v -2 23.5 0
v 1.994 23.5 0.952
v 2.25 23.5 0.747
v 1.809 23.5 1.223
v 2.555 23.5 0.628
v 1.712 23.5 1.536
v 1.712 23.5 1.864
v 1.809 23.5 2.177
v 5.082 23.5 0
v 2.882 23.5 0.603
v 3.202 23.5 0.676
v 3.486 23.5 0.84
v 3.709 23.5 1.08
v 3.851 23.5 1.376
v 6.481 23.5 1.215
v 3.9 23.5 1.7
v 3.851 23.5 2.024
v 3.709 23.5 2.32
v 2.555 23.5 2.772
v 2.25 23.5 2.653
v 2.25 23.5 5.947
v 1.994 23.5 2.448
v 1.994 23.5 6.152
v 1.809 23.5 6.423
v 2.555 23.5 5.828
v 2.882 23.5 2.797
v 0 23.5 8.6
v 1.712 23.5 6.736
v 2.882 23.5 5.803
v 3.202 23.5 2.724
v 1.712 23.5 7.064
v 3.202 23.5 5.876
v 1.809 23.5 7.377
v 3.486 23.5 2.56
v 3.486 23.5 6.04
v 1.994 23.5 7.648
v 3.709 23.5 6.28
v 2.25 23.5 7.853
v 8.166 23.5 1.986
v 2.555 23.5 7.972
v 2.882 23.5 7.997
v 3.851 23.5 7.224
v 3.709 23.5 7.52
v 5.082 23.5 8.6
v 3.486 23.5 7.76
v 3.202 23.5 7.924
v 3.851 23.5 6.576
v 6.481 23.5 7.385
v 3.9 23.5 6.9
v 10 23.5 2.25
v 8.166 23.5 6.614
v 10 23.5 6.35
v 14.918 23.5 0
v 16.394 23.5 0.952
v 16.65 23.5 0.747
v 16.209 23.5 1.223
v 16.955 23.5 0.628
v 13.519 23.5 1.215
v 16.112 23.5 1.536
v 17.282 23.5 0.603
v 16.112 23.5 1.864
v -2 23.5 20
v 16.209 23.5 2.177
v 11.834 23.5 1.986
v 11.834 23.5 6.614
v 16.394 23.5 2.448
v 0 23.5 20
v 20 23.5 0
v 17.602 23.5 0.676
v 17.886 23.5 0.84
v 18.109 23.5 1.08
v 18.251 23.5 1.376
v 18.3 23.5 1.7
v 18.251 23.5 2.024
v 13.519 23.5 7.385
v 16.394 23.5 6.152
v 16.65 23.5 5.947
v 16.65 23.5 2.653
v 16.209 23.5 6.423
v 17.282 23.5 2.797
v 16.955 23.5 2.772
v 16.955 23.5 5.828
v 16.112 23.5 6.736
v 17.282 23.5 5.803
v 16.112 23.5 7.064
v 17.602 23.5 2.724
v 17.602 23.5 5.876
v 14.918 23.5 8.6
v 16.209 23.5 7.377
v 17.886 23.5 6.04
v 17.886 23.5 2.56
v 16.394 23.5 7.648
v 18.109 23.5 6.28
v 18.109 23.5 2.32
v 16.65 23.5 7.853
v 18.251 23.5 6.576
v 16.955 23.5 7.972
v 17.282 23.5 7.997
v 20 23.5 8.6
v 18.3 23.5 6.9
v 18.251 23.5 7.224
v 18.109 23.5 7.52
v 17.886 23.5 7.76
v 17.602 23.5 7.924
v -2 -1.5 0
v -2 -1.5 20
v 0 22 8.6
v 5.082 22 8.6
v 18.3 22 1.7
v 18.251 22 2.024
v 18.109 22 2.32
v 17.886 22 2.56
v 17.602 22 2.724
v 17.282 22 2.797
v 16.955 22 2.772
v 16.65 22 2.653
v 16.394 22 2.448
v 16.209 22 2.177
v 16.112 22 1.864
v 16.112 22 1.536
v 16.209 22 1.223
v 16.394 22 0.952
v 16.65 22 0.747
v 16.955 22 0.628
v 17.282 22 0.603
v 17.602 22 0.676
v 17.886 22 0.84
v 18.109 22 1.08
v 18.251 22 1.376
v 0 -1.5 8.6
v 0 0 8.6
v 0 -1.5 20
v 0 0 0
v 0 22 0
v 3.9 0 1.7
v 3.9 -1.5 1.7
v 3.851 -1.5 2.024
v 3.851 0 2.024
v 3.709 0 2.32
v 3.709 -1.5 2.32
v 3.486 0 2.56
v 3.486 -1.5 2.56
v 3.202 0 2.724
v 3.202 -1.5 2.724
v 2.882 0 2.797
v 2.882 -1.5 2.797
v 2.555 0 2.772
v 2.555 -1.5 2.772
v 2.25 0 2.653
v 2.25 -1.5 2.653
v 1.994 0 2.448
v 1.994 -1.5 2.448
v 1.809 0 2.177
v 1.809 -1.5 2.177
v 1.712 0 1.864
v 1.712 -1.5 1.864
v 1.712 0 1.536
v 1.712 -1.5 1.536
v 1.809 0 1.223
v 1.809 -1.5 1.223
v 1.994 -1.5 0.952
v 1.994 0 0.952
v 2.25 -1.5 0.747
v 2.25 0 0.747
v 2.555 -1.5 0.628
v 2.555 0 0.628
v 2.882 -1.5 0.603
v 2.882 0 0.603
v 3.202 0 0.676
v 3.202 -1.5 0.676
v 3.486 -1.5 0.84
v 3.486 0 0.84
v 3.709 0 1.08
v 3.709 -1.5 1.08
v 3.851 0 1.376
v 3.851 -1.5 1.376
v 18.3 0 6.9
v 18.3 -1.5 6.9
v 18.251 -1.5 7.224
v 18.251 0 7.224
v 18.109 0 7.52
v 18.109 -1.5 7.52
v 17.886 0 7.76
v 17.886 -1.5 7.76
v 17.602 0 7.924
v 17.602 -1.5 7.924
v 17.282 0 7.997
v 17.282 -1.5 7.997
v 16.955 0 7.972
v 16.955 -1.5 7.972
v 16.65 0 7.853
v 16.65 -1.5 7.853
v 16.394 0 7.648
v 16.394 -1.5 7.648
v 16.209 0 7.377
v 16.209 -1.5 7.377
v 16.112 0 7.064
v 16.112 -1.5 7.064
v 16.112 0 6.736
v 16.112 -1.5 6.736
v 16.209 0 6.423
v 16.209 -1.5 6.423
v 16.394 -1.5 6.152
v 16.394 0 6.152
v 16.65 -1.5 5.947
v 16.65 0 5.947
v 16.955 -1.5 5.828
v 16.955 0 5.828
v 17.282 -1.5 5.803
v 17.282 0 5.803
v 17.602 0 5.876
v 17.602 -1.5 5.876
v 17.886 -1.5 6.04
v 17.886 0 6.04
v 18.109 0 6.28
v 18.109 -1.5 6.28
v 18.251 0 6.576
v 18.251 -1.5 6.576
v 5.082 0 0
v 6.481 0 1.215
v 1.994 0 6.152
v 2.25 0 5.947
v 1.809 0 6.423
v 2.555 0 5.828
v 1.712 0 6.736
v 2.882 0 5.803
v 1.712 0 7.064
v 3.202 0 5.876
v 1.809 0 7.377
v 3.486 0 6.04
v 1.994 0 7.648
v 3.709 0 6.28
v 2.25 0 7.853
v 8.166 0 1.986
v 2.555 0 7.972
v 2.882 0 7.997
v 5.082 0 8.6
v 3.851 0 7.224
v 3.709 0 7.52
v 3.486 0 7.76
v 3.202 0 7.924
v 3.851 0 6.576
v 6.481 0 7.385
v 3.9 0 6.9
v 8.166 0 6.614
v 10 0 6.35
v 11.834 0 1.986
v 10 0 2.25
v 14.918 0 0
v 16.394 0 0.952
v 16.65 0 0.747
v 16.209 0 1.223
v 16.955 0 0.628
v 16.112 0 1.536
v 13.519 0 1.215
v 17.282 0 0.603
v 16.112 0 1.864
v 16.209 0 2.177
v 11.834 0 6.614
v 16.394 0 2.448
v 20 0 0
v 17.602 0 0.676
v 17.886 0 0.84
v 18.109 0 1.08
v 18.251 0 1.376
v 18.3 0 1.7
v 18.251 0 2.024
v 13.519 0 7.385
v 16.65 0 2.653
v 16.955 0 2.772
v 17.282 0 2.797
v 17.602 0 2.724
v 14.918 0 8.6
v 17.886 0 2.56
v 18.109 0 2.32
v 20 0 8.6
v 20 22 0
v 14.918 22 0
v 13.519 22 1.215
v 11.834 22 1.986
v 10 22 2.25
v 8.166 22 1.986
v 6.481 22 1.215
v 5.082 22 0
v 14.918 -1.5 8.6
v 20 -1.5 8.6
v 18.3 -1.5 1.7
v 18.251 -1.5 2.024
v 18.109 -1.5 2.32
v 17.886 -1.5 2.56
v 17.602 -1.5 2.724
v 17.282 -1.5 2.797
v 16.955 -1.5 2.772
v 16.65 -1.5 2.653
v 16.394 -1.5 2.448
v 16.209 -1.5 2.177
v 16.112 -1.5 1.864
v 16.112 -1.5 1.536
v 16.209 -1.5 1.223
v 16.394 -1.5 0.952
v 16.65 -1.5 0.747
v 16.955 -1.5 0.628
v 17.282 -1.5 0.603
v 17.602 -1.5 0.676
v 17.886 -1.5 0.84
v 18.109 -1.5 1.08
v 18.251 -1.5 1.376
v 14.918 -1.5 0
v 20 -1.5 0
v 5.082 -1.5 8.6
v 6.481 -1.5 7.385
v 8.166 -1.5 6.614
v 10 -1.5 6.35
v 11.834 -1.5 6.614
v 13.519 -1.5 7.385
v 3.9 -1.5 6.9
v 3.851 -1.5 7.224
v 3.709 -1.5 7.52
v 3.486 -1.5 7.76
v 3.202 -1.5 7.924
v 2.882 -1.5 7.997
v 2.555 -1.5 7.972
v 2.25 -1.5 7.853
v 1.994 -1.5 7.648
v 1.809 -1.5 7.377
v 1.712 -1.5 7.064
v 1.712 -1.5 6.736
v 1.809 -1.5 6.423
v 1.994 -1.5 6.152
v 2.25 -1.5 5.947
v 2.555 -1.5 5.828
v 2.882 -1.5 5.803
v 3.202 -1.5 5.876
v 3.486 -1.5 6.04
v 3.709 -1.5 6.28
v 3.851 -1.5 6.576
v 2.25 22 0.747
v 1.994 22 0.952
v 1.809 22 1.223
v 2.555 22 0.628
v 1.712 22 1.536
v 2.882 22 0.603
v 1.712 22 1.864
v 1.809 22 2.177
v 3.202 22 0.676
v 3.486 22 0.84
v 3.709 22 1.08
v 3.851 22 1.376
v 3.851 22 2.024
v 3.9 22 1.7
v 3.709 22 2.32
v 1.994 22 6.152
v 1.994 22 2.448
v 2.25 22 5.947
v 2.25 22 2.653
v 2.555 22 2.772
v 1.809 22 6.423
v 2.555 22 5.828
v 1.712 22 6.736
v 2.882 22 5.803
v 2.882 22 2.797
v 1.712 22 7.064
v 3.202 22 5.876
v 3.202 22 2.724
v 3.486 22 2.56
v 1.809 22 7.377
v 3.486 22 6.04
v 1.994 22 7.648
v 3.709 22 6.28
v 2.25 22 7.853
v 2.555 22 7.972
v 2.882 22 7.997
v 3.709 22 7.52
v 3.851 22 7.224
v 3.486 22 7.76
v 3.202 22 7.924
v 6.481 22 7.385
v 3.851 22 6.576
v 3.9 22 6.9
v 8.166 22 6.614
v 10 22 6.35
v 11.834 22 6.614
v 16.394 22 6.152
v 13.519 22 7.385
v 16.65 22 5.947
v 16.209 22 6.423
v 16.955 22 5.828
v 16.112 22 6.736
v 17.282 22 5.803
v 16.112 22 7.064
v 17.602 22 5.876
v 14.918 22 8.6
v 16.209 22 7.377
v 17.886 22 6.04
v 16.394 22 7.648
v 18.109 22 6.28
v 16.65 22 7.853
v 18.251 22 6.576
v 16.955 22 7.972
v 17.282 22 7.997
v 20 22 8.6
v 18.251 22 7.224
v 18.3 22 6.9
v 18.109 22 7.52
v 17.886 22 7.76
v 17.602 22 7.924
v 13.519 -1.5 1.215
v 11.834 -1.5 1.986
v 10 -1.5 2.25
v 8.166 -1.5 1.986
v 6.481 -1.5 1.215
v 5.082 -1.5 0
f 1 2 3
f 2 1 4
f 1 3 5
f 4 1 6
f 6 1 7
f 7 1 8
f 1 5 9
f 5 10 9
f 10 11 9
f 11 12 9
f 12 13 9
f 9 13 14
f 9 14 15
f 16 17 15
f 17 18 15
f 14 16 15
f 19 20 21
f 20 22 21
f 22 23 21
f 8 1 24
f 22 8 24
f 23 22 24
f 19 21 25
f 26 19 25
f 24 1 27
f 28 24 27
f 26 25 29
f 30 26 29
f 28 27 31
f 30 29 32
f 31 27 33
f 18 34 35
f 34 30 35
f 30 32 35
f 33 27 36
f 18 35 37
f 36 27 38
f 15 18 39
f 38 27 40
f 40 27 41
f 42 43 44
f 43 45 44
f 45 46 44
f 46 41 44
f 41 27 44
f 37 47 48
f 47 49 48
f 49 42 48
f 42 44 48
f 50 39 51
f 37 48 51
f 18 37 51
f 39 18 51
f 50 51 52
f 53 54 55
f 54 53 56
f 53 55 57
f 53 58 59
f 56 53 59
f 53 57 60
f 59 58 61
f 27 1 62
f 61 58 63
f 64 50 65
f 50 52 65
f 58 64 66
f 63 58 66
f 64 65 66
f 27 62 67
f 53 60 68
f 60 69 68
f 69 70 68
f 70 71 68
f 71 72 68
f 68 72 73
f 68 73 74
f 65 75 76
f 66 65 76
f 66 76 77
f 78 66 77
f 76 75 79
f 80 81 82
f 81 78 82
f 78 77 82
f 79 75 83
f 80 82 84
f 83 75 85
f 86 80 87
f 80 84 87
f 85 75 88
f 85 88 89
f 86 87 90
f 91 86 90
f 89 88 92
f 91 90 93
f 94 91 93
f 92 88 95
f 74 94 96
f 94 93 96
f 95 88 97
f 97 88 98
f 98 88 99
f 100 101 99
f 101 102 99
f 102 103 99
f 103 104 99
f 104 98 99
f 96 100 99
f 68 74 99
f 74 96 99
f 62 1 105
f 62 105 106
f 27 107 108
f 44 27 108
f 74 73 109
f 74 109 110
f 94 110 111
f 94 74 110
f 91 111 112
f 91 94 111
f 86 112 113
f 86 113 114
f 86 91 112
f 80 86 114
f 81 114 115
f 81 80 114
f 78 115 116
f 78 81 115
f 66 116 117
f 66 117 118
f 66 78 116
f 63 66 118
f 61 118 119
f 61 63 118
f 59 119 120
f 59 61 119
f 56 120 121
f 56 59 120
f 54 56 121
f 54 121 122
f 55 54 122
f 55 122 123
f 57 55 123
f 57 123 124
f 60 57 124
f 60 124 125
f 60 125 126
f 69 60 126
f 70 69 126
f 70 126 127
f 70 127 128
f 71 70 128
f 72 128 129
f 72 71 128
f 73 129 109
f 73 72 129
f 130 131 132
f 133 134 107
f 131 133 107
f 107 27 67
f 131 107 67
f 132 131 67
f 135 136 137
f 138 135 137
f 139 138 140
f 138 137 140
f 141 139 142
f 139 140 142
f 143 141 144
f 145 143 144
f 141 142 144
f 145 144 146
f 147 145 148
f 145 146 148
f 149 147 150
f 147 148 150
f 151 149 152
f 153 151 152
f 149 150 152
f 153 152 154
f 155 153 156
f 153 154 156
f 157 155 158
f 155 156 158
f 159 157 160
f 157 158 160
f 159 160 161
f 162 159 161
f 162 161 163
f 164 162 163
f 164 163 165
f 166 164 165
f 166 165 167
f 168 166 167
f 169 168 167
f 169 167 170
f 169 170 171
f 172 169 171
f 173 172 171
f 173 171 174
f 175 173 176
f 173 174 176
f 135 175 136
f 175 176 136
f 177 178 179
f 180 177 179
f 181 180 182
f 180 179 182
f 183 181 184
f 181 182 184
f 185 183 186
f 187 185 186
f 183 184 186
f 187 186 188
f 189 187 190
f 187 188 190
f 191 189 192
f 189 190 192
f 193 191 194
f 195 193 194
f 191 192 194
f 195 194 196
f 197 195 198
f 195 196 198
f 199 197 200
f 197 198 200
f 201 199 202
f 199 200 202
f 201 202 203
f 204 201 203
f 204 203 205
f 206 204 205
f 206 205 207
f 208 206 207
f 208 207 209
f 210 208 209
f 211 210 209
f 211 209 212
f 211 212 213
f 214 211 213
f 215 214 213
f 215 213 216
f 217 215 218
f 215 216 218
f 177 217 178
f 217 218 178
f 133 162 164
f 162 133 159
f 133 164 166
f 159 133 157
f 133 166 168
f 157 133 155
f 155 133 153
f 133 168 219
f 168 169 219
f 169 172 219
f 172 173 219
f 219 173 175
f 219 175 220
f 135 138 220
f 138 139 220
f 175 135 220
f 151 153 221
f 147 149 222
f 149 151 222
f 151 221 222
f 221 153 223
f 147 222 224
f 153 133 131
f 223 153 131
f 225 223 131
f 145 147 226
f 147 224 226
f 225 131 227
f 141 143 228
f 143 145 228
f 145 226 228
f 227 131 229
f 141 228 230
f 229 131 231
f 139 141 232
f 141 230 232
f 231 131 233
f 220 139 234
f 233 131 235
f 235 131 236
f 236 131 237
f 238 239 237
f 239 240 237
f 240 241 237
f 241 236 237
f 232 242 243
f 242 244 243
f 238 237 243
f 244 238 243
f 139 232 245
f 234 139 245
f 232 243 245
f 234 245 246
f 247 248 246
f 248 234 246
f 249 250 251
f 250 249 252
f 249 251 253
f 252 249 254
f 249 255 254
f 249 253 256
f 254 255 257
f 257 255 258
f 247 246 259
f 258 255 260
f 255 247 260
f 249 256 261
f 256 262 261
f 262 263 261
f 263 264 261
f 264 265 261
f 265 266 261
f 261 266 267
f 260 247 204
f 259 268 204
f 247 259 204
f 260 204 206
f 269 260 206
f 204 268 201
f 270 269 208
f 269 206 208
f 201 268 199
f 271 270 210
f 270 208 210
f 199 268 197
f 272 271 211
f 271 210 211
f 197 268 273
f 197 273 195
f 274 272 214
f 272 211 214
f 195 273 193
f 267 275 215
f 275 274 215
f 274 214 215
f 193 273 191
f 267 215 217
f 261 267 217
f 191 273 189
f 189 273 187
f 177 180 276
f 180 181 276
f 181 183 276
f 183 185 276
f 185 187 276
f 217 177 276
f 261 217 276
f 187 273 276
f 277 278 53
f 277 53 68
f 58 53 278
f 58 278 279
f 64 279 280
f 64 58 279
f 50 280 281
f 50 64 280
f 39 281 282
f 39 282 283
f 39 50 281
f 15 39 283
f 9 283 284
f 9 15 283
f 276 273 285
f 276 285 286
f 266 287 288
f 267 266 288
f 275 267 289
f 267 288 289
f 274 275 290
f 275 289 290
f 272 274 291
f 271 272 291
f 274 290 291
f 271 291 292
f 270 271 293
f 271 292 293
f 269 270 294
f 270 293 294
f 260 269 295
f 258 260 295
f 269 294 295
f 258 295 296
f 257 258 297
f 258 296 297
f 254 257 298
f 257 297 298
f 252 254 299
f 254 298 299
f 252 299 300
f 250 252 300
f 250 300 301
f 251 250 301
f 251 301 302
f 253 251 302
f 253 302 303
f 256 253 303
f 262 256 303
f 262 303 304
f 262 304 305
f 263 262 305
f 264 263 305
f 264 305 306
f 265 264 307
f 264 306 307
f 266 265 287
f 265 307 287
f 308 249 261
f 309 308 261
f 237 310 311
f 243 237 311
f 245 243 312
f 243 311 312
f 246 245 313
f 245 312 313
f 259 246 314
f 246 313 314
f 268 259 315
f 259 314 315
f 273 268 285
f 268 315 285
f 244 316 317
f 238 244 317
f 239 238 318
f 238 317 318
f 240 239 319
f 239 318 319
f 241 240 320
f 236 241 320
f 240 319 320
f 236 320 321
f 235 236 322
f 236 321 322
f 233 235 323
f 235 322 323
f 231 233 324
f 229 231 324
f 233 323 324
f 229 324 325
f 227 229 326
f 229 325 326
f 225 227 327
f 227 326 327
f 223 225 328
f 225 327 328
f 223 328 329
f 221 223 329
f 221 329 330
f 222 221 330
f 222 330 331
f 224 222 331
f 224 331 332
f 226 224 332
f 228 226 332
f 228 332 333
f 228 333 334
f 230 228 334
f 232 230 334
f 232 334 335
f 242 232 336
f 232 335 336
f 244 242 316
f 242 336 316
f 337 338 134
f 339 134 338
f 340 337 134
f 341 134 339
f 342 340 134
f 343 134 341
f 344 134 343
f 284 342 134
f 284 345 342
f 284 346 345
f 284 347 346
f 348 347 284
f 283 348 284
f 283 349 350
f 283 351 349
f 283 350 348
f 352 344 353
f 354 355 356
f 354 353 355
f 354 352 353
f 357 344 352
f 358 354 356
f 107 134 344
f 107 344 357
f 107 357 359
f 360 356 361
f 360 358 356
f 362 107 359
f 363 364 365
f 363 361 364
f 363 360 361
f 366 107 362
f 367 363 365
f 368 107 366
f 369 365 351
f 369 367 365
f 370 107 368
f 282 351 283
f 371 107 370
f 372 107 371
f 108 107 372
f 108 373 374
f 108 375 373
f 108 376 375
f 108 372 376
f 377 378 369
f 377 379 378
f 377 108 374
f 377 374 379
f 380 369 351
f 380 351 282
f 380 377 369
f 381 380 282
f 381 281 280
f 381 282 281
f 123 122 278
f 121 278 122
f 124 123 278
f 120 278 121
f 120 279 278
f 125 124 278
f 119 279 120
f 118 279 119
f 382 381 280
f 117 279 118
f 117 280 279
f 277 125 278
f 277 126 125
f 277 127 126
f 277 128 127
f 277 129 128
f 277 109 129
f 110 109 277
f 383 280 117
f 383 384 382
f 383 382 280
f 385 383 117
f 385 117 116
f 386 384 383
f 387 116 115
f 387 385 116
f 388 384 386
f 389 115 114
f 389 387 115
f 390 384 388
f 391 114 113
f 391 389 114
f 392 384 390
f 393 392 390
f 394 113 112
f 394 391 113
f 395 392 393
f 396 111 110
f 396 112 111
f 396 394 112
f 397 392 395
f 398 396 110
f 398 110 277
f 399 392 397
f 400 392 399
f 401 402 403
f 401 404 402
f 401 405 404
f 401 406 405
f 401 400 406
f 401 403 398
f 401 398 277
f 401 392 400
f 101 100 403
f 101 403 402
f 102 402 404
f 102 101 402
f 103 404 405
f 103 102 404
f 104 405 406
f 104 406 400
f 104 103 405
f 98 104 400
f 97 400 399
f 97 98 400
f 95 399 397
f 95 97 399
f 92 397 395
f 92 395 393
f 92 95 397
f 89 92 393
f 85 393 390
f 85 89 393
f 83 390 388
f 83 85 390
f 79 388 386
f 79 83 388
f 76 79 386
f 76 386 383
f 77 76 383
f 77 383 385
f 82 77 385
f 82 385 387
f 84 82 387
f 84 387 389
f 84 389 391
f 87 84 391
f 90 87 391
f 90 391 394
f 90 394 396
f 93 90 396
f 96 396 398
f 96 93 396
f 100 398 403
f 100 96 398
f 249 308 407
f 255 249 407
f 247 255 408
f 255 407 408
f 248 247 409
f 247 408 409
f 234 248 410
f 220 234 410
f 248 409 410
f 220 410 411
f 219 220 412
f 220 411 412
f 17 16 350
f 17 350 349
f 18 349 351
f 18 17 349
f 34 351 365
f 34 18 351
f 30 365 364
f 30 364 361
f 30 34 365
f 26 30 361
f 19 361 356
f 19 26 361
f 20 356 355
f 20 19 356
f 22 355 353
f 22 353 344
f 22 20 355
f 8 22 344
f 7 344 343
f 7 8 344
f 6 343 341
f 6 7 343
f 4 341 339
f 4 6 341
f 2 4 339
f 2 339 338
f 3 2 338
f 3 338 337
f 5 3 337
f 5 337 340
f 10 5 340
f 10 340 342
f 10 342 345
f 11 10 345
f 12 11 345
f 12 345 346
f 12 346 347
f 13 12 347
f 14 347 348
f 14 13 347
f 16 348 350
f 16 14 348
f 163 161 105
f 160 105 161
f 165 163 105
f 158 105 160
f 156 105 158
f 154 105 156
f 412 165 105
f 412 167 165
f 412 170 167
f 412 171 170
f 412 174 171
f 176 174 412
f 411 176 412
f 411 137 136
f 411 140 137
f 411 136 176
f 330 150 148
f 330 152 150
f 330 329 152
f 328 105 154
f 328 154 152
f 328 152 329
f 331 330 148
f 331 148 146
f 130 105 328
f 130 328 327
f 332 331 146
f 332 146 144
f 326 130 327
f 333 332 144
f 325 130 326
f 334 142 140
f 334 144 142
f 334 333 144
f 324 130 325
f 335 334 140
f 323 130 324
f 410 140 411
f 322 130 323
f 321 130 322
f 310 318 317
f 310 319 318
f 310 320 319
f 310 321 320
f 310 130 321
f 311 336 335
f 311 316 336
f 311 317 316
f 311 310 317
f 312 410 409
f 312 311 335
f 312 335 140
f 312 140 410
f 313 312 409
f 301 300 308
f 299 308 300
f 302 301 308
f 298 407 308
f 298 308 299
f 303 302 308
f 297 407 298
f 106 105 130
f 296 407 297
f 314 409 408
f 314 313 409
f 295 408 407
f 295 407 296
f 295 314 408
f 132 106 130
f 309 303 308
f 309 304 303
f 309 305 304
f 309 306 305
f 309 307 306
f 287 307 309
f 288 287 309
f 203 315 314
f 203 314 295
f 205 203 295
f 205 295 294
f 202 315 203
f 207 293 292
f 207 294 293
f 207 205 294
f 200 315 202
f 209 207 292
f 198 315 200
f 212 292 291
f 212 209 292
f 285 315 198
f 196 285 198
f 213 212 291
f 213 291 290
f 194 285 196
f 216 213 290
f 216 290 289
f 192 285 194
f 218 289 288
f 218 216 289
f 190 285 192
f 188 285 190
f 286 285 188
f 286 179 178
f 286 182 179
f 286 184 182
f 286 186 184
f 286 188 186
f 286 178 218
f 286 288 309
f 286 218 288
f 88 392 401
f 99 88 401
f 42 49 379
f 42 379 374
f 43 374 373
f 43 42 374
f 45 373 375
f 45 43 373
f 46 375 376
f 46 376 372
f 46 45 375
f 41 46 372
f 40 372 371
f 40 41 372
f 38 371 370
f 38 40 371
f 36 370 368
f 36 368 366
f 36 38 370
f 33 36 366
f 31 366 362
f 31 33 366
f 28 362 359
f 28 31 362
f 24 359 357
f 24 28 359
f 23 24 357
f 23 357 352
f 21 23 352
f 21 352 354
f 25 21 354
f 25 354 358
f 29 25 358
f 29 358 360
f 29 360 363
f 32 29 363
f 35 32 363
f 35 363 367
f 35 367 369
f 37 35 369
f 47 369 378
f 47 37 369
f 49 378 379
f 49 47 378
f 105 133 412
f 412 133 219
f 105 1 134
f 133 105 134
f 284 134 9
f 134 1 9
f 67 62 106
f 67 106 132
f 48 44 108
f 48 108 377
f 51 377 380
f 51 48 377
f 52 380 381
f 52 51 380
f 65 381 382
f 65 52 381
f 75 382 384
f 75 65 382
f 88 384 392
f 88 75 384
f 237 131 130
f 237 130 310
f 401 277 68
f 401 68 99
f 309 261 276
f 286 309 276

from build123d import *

# Parameters (mm, degrees)
F0_W     = 20
F0_H     = 8.6
F1_DEPTH = 1.5
F2_R     = 1.1
F3_DEPTH = 1.5
F4_W     = 2
F4_H     = 20
F5_DEPTH = 12.5


with BuildPart() as f1:
    # F0 (on Front) → F1 (new body)
    with BuildSketch(Plane.XZ):
        with Locations((10, 4.3)):
            Rectangle(F0_W, F0_H)
    extrude(amount=F1_DEPTH)

    # F2 (on face) → F3 (cut, through all)
    with BuildSketch(Plane.XZ.offset(1.5)):
        with Locations((2.8, 6.9)):
            Circle(F2_R)
        with Locations((17.2, 6.9)):
            Circle(F2_R)
        with Locations((2.8, 1.7)):
            Circle(F2_R)
        with Locations((17.2, 1.7)):
            Circle(F2_R)
        with BuildLine():
            Line((14.918079, 8.6), (5.081921, 8.6))
            ThreePointArc((5.081921, 8.6), (10, 6.35), (14.918079, 8.6))
        make_face()
        with BuildLine():
            ThreePointArc((14.918079, 0), (10, 2.25), (5.081921, 0))
            Line((5.081921, 0), (14.918079, 0))
        make_face()
    extrude(amount=-F3_DEPTH, mode=Mode.SUBTRACT)

    # F4 (on face) → F5 (join)
    with BuildSketch(Plane.XZ.offset(1.5)):
        with Locations((-1, 10)):
            Rectangle(F4_W, F4_H)
    extrude(amount=-F5_DEPTH)

    # F7: F1 across plane


with BuildPart() as f1_1:
    add(f1.part)
    add(f1.part.mirror(Plane.XZ.offset(-11)))


solid = f1_1.part
